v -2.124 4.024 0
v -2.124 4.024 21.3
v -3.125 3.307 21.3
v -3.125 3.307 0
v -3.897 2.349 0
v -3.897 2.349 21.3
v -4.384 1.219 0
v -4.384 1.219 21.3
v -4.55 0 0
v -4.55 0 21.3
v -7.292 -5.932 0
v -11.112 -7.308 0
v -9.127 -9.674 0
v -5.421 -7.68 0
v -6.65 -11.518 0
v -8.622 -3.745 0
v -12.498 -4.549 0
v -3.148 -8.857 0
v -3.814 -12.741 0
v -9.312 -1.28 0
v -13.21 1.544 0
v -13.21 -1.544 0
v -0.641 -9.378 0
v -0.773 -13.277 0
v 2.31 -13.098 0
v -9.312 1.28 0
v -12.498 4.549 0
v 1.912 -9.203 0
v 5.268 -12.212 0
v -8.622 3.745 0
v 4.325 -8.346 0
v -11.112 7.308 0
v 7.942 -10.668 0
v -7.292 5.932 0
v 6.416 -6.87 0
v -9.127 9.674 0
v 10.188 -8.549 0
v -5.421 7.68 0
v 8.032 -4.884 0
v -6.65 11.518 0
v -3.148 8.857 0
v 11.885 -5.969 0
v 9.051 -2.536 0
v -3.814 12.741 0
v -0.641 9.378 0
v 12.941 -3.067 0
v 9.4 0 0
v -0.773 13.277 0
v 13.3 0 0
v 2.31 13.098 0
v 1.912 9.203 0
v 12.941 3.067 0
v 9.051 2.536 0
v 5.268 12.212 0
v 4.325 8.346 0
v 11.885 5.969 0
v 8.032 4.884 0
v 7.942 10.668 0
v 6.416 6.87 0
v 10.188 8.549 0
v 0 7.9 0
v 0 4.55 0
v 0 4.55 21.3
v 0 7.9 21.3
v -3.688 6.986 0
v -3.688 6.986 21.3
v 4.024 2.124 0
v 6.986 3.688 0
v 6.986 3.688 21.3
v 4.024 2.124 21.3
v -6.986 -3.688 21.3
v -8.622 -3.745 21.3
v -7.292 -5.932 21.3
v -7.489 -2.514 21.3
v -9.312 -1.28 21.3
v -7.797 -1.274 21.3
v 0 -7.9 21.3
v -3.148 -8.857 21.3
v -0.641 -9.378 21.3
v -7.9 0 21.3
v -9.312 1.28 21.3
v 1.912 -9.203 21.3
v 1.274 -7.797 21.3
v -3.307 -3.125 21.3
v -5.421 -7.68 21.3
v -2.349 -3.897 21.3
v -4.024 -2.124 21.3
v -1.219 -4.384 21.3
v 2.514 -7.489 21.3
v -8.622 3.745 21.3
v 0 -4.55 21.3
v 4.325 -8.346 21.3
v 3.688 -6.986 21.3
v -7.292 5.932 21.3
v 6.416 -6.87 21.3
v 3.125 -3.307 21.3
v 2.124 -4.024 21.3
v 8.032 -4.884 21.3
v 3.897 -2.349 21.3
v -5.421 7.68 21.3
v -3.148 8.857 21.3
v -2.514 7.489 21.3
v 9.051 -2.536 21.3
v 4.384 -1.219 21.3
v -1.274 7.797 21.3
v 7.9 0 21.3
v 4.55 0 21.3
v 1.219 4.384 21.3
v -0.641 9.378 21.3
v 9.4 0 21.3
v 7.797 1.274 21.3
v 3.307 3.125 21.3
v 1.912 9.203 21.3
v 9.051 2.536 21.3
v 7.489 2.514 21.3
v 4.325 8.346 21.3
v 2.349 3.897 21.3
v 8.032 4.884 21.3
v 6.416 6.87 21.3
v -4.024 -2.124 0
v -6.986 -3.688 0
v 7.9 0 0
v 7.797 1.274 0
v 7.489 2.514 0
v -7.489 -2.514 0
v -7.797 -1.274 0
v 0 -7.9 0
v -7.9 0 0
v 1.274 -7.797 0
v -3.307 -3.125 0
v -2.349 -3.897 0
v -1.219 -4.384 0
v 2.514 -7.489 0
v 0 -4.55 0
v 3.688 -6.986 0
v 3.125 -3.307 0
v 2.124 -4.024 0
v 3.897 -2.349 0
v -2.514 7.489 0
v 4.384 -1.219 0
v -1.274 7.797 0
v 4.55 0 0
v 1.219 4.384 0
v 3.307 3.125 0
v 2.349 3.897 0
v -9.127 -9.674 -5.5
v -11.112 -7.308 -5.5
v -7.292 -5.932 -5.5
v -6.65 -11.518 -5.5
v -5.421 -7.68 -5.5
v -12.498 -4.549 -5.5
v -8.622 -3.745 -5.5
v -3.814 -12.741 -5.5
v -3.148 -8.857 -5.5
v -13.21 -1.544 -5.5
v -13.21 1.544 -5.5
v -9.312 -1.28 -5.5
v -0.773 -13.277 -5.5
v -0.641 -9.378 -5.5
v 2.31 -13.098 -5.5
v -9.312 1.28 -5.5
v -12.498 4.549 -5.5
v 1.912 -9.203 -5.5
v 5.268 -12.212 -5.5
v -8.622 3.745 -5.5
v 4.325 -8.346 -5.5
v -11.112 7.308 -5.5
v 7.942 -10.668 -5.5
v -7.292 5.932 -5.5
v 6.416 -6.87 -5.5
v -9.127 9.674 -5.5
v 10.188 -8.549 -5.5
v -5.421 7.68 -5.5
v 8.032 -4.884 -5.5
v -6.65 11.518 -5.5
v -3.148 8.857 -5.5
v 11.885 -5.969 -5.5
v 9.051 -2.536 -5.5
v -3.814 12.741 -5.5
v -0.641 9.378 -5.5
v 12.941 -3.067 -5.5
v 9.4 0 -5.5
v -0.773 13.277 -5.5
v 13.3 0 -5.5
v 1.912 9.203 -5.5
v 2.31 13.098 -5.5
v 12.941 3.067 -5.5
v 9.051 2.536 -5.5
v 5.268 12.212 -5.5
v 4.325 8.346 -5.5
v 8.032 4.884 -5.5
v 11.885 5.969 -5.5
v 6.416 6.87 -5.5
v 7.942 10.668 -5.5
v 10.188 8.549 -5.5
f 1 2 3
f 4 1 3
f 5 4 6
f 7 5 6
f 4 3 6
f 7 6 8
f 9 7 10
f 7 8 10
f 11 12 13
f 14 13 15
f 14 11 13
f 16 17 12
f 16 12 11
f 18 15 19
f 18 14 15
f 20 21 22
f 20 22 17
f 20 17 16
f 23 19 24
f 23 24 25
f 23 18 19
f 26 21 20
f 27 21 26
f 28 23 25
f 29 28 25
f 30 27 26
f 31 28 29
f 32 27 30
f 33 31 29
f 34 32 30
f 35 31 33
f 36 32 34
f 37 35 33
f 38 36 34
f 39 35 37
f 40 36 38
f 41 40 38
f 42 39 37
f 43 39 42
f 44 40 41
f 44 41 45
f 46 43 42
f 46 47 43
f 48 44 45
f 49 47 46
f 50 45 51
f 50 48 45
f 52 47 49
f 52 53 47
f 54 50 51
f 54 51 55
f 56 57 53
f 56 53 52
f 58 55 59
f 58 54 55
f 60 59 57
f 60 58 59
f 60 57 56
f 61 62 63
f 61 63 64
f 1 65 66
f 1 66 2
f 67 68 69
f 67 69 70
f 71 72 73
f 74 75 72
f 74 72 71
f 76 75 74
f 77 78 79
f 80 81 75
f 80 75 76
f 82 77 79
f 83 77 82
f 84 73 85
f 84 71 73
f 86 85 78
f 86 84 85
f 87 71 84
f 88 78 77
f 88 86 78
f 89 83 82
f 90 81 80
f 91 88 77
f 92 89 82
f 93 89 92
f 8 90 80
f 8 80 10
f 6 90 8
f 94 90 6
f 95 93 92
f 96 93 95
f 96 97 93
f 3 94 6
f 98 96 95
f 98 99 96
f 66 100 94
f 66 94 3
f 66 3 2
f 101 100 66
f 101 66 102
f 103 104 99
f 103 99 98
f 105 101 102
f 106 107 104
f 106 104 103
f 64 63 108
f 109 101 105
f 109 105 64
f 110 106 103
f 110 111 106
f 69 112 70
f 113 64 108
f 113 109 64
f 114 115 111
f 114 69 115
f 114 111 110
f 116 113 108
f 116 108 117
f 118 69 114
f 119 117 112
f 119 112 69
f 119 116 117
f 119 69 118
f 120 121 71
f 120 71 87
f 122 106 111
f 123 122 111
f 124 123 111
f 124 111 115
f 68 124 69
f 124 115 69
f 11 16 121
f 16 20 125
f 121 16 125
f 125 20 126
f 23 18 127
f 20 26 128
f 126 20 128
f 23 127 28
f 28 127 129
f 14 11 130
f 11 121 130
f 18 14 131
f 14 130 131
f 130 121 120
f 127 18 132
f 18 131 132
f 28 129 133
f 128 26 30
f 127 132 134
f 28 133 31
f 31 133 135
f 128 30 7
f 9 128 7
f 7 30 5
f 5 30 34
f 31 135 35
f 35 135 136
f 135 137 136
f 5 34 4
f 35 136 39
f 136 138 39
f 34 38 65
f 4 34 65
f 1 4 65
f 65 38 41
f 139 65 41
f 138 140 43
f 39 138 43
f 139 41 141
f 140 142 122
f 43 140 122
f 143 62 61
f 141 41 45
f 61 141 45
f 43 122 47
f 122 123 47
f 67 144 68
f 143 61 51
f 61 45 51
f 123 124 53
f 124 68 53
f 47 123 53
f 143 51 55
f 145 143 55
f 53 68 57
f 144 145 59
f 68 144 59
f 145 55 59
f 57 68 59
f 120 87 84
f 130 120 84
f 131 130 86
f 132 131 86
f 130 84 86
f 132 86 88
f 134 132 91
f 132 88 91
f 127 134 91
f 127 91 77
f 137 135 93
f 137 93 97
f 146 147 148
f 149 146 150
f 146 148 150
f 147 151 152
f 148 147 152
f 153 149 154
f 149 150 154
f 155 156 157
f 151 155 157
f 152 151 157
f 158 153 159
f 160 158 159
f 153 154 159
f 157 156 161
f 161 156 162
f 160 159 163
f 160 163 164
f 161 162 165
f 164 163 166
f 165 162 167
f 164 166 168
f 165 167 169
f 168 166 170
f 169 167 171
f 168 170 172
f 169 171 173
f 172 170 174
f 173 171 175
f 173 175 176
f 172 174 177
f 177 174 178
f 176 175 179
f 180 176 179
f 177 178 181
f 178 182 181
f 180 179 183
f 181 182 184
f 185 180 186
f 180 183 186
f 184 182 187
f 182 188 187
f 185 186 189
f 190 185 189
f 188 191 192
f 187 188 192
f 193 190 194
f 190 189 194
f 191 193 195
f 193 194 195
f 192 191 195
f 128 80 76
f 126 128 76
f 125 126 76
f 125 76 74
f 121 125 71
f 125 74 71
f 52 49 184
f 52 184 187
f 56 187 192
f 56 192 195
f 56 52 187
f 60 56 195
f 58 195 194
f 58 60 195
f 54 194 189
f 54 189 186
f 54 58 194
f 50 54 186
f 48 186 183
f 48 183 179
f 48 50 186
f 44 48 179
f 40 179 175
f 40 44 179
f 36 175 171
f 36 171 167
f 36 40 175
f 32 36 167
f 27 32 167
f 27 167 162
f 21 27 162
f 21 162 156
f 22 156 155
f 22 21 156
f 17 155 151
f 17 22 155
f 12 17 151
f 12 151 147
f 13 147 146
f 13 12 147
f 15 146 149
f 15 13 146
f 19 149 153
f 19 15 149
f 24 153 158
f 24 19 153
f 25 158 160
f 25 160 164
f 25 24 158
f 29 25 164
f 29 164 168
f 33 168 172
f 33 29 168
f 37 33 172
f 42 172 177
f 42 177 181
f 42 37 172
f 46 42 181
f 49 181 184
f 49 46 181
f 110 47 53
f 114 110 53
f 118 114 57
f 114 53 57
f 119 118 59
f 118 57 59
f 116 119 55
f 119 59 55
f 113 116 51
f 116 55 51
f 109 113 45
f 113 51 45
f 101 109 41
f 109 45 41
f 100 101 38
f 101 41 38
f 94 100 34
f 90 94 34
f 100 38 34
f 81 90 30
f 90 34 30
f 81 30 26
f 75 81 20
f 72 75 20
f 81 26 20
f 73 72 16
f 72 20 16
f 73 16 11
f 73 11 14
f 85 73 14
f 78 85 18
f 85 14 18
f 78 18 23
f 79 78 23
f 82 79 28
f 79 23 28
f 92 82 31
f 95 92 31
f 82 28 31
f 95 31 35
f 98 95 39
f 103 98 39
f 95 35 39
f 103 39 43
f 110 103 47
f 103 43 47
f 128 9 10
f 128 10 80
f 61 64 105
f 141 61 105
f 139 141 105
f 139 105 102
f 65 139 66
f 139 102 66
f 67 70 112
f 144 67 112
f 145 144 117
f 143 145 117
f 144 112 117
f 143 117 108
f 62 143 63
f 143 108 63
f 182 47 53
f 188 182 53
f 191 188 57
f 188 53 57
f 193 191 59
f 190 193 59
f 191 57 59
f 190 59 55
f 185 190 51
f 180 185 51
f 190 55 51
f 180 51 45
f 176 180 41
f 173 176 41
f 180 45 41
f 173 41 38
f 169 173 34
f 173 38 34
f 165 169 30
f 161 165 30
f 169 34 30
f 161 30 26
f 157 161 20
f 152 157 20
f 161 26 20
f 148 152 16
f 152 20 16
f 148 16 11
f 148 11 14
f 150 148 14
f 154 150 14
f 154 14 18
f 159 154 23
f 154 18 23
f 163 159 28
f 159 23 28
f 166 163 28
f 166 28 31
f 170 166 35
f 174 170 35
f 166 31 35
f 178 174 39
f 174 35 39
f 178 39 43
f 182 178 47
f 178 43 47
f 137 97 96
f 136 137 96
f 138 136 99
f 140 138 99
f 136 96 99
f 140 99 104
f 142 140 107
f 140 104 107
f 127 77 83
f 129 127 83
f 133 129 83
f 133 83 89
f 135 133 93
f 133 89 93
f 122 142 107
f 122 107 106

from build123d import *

# Parameters (mm, degrees)
F0_R     = 13.3
F0_R_2   = 9.4
F1_DEPTH = 5.5
F2_R     = 9.4
F3_DEPTH = 21.3
F6_DEPTH = 25


with BuildPart() as f1:
    # F0 (on Top) → F1 (new body)
    with BuildSketch(Plane.XY):
        Circle(F0_R)
        Circle(F0_R_2, mode=Mode.SUBTRACT)
    extrude(amount=-F1_DEPTH)


with BuildPart() as f3:
    # F2 (on Top) → F3 (new body)
    with BuildSketch(Plane.XY):
        Circle(F2_R)
    extrude(amount=F3_DEPTH)

    # F5 (on face) → F6 (cut)
    with BuildSketch(Plane.XY.offset(21.3)):
        with BuildLine():
            Line((4.55, 0), (7.9, 0))
            ThreePointArc((7.9, 0), (7.668116, 1.9), (6.986076, 3.688461))
            Line((6.986076, 3.688461), (4.023626, 2.124367))
            ThreePointArc((4.023626, 2.124367), (2.34911, 3.896689), (0, 4.55))
            Line((0, 4.55), (0, 7.9))
            ThreePointArc((0, 7.9), (-1.9, 7.668116), (-3.688461, 6.986076))
            Line((-3.688461, 6.986076), (-2.124367, 4.023626))
            ThreePointArc((-2.124367, 4.023626), (-3.896689, 2.34911), (-4.55, 0))
            Line((-4.55, 0), (-7.9, 0))
            ThreePointArc((-7.9, 0), (-7.668116, -1.9), (-6.986076, -3.688461))
            Line((-6.986076, -3.688461), (-4.023626, -2.124367))
            ThreePointArc((-4.023626, -2.124367), (-2.34911, -3.896689), (0, -4.55))
            Line((0, -4.55), (0, -7.9))
            ThreePointArc((0, -7.9), (1.9, -7.668116), (3.688461, -6.986076))
            Line((3.688461, -6.986076), (2.124367, -4.023626))
            ThreePointArc((2.124367, -4.023626), (3.896689, -2.34911), (4.55, 0))
        make_face()
    extrude(amount=-F6_DEPTH, mode=Mode.SUBTRACT)


solid = Compound([f1.part, f3.part])
